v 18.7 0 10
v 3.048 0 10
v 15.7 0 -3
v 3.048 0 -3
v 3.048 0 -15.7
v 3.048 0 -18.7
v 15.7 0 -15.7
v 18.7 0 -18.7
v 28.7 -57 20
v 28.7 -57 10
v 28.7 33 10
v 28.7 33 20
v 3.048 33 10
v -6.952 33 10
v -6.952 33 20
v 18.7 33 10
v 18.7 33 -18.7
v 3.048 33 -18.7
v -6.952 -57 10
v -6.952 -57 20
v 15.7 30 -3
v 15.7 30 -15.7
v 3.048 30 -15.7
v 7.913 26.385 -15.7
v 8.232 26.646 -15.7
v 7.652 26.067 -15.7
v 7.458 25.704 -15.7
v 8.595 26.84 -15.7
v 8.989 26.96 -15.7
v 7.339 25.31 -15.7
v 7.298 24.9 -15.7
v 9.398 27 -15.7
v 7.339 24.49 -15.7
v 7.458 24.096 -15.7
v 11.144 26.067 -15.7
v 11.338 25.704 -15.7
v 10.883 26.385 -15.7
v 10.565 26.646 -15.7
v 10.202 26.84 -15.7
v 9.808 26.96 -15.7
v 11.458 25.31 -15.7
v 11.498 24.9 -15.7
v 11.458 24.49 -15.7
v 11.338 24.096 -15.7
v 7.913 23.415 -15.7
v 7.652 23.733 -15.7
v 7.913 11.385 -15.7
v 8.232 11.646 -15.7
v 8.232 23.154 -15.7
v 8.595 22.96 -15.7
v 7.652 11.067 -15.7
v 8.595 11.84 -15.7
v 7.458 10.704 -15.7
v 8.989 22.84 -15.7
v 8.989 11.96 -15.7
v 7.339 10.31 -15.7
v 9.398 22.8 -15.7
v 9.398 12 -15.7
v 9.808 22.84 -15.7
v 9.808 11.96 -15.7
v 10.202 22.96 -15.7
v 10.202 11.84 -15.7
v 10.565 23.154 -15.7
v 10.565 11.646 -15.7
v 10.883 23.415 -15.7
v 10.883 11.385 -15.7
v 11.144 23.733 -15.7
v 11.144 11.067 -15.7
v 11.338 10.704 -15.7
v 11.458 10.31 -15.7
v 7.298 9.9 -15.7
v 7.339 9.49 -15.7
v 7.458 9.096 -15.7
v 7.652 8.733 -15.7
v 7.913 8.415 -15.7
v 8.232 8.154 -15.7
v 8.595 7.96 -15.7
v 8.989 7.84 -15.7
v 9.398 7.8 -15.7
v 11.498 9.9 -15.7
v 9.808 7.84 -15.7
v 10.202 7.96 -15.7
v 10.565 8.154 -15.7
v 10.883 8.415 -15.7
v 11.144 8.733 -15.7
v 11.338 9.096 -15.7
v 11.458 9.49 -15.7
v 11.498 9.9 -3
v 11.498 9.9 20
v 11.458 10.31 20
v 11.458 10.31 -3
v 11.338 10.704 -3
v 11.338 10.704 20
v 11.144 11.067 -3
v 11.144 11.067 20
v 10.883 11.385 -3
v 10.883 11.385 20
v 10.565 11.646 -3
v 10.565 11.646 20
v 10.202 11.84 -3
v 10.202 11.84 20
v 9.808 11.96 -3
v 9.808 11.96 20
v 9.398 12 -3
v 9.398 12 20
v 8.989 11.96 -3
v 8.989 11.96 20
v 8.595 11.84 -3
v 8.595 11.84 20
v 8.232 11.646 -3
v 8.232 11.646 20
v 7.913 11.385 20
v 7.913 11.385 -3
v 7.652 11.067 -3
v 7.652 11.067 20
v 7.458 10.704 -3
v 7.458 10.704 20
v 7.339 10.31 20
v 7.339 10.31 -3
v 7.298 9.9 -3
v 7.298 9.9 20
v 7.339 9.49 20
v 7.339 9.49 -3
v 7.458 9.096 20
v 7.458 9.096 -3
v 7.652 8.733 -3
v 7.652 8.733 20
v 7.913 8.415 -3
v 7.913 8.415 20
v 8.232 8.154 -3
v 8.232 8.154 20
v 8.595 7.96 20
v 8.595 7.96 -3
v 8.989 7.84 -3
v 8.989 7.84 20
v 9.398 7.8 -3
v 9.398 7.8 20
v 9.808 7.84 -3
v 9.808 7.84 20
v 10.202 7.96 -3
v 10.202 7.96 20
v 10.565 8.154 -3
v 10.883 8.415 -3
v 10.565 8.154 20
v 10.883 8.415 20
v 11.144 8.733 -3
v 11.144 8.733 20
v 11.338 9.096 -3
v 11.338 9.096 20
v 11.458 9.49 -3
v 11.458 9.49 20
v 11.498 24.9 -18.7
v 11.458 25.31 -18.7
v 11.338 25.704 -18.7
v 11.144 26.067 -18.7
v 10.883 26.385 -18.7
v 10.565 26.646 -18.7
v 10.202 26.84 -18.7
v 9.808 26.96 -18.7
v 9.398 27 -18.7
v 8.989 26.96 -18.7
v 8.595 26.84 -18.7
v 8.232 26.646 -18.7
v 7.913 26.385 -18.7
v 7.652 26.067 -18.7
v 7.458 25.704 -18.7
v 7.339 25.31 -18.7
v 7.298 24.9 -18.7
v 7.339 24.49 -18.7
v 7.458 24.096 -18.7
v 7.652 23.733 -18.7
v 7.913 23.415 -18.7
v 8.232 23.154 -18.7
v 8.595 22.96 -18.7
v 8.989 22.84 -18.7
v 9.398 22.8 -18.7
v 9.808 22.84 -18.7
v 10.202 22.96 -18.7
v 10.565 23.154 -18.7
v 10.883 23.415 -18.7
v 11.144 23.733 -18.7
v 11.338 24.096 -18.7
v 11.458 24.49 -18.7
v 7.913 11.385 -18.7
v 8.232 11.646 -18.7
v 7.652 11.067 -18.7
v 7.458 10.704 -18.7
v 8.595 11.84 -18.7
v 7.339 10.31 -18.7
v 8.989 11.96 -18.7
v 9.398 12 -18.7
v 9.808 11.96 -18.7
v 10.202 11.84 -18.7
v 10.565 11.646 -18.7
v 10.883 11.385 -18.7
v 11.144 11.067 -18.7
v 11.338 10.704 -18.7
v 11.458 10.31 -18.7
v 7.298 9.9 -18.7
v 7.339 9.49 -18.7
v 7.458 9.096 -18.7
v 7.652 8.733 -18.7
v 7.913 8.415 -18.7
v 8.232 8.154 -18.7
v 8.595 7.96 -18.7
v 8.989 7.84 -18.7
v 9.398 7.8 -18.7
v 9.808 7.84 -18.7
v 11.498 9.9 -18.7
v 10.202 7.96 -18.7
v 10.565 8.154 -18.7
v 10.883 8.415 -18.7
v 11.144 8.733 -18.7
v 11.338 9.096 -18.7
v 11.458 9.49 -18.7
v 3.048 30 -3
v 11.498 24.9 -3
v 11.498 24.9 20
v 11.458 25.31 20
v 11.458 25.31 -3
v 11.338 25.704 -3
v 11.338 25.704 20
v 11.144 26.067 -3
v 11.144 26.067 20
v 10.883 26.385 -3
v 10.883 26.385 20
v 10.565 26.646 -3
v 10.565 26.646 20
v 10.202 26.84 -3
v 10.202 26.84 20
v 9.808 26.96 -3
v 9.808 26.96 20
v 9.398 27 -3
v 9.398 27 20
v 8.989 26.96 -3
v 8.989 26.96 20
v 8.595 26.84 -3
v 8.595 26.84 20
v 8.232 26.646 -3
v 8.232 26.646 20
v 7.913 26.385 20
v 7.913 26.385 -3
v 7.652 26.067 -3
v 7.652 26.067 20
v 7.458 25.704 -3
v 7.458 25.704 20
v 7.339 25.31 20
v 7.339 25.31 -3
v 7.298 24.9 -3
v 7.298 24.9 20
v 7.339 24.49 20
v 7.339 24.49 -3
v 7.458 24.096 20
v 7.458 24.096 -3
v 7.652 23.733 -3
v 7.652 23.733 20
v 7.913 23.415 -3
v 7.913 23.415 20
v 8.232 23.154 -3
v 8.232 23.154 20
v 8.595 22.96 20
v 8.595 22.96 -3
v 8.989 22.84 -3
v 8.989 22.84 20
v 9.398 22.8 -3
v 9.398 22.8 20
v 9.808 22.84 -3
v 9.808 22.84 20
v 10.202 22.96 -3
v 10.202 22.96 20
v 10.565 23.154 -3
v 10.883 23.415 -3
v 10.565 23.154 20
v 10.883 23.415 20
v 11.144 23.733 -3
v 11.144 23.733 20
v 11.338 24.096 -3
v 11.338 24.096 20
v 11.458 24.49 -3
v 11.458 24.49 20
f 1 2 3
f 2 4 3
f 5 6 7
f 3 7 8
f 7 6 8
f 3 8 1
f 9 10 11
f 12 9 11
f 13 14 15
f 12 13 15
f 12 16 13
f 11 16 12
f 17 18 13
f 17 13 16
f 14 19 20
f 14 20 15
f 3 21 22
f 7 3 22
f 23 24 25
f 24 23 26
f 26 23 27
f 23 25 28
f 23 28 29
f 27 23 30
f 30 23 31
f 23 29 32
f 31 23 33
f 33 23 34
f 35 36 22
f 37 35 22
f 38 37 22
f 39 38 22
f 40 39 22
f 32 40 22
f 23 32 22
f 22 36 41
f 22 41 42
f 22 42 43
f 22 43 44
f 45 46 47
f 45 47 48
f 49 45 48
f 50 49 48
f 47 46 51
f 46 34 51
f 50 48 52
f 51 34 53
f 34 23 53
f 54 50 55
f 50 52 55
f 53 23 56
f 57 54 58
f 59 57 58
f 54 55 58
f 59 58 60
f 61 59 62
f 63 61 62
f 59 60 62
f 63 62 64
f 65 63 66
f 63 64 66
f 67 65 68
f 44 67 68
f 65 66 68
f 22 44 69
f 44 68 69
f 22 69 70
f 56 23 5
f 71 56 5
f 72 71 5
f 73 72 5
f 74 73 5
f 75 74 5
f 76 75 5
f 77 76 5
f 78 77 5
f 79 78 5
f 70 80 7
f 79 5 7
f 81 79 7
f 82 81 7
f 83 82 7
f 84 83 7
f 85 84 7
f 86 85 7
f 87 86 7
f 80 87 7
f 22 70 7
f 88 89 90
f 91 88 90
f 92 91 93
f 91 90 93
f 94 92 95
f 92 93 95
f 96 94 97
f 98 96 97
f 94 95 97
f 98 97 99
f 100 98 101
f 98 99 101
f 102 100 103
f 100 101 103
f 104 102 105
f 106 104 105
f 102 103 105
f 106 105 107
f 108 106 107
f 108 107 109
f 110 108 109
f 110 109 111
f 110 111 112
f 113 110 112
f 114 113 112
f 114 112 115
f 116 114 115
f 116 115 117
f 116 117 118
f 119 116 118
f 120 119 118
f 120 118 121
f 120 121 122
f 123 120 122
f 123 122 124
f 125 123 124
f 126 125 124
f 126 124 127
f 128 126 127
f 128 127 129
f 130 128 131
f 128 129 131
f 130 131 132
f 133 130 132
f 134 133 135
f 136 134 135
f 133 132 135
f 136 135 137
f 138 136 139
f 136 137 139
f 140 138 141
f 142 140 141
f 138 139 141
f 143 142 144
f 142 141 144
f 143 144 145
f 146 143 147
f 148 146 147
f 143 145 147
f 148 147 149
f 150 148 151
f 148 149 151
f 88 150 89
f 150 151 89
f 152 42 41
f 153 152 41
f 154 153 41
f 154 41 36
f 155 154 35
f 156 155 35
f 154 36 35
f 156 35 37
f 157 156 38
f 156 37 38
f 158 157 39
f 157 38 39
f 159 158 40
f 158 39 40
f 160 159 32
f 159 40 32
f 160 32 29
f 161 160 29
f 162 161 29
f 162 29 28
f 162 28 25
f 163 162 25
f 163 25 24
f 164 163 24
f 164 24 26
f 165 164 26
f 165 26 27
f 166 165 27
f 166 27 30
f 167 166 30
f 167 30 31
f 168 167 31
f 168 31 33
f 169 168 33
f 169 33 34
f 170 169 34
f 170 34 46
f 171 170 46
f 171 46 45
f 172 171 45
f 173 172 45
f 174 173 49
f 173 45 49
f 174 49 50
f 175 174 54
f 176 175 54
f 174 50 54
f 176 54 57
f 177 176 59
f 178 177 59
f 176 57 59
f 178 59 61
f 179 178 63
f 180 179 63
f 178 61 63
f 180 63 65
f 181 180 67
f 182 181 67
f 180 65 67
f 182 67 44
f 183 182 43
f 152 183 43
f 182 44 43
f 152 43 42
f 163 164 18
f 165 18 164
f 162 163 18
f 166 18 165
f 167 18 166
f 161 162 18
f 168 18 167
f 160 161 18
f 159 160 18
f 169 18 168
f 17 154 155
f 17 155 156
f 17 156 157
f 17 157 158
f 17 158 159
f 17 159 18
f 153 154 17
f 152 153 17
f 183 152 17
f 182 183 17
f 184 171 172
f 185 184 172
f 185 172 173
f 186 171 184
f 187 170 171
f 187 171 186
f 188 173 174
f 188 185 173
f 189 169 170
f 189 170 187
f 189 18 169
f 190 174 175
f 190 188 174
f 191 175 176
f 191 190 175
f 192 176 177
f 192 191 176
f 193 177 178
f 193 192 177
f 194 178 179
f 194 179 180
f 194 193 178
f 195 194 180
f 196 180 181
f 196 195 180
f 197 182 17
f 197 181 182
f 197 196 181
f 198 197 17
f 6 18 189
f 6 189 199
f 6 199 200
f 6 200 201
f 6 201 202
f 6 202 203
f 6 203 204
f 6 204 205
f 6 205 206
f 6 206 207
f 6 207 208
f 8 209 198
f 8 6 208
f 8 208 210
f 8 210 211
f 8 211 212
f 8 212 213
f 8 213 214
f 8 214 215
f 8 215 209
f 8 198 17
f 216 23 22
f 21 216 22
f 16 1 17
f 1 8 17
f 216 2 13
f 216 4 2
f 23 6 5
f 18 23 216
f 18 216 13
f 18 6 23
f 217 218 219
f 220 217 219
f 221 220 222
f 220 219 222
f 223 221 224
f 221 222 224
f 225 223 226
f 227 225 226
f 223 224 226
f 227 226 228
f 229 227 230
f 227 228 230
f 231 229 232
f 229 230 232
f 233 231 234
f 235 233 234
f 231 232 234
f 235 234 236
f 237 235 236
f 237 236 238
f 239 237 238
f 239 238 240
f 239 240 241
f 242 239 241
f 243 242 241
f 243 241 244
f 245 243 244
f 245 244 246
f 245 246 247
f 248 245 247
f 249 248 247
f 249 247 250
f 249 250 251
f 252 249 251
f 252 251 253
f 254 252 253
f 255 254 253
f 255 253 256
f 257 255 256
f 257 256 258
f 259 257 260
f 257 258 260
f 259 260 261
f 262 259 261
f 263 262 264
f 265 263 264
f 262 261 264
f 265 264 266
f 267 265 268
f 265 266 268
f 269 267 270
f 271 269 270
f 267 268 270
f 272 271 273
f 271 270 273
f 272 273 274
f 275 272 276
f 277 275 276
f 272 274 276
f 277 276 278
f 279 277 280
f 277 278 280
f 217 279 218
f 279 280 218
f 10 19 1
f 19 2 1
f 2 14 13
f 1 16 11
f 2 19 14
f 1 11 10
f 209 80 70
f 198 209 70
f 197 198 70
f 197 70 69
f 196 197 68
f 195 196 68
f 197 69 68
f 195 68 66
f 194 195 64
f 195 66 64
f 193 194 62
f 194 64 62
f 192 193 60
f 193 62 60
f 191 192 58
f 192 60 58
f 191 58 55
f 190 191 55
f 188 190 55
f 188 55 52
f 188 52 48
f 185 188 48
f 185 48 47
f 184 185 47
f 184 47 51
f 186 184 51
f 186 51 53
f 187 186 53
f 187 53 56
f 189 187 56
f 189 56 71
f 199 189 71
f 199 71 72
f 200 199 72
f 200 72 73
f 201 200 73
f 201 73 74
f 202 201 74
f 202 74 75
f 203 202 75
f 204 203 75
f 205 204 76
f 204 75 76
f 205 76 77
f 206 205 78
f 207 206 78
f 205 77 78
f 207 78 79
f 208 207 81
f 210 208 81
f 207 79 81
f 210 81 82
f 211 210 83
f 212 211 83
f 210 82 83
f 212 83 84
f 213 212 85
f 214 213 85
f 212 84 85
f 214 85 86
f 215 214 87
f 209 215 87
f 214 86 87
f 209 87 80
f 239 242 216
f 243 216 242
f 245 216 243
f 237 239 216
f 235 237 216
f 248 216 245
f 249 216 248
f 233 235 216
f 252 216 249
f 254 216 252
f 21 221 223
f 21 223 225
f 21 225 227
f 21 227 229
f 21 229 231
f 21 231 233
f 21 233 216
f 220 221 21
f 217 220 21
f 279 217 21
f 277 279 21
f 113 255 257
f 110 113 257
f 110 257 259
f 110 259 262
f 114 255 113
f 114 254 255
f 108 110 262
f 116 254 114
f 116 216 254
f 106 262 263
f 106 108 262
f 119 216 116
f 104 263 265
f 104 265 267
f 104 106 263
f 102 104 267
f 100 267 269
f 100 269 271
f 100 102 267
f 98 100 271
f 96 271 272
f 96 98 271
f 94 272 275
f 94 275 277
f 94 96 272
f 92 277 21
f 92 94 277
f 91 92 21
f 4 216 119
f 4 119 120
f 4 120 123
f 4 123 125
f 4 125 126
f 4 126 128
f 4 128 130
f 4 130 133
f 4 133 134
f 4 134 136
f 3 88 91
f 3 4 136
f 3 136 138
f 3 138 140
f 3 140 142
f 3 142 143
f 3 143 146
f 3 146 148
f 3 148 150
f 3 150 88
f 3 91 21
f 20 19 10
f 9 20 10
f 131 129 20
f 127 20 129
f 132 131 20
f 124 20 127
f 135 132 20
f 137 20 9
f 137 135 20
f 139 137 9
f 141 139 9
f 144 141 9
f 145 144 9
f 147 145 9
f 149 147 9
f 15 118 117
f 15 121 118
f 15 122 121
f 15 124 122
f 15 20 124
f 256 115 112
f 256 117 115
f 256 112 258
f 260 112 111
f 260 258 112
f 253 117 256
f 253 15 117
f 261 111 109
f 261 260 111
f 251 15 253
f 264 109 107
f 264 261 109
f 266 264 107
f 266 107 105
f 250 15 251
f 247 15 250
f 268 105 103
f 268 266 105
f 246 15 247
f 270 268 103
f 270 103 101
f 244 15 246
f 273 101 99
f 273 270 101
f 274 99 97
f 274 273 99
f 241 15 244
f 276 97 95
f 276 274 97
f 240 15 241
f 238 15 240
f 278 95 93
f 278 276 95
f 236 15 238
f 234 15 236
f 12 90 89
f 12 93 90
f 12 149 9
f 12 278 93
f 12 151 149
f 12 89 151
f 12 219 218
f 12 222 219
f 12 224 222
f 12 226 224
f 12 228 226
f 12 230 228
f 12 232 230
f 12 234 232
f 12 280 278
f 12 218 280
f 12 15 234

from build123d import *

# Parameters (mm, degrees)
SKETCH3_W             = 18.7
SKETCH3_H             = 18.7
SKETCH3_W_2           = 12.7
SKETCH3_H_2           = 12.7
BOSS_EXTRUDE2_DEPTH   = 30
SKETCH4_W             = 18.7
SKETCH4_H             = 18.7
BOSS_EXTRUDE3_DEPTH   = 3
SKETCH13_W            = 3.048327816
SKETCH13_H            = 18.7
CUT_EXTRUDE1_DEPTH    = 33
SKETCH16_W            = 15.651672184
SKETCH16_H            = 33
BOSS_EXTRUDE6_DEPTH   = 10
SKETCH17_W            = 35.651672184
SKETCH17_H            = 90
BOSS_EXTRUDE7_DEPTH   = 10
M5X0_8_TAPPED_HOLE1_D = 4.2


with BuildPart() as part:
    # Sketch3 → Boss-Extrude2 (new body)
    with BuildSketch(Plane(origin=(0, 0, 0), x_dir=(1, 0, 0), z_dir=(0, 1, 0))):
        with Locations((9.35, 9.35)):
            Rectangle(SKETCH3_W, SKETCH3_H)
        with Locations((9.35, 9.35)):
            Rectangle(SKETCH3_W_2, SKETCH3_H_2, mode=Mode.SUBTRACT)
    extrude(amount=BOSS_EXTRUDE2_DEPTH)

    # Sketch4 → Boss-Extrude3 (add)
    with BuildSketch(Plane(origin=(0, 30, 0), x_dir=(1, 0, 0), z_dir=(0, 1, 0))):
        with Locations((9.35, 9.35)):
            Rectangle(SKETCH4_W, SKETCH4_H)
    extrude(amount=BOSS_EXTRUDE3_DEPTH)

    # Sketch13 → Cut-Extrude1 (cut)
    with BuildSketch(Plane.XZ):
        with Locations((1.524163908, -9.35)):
            Rectangle(SKETCH13_W, SKETCH13_H)
    extrude(amount=-CUT_EXTRUDE1_DEPTH, mode=Mode.SUBTRACT)

    # Sketch16 → Boss-Extrude6 (add)
    with BuildSketch(Plane.XY):
        with Locations((10.874163908, 16.5)):
            Rectangle(SKETCH16_W, SKETCH16_H)
    extrude(amount=BOSS_EXTRUDE6_DEPTH)

    # Sketch17 → Boss-Extrude7 (add)
    with BuildSketch(Plane.XY.offset(10)):
        with Locations((10.874163908, -12)):
            Rectangle(SKETCH17_W, SKETCH17_H)
    extrude(amount=BOSS_EXTRUDE7_DEPTH)

    # M5x0.8 Tapped Hole1 (through all)
    with Locations(Plane(origin=(9.398327816, 24.9, -18.7), x_dir=(-1, 0, 0), z_dir=(0, 0, -1))):
        with Locations((0, 0), (0, -15)):
            Hole(M5X0_8_TAPPED_HOLE1_D / 2)


solid = part.part
